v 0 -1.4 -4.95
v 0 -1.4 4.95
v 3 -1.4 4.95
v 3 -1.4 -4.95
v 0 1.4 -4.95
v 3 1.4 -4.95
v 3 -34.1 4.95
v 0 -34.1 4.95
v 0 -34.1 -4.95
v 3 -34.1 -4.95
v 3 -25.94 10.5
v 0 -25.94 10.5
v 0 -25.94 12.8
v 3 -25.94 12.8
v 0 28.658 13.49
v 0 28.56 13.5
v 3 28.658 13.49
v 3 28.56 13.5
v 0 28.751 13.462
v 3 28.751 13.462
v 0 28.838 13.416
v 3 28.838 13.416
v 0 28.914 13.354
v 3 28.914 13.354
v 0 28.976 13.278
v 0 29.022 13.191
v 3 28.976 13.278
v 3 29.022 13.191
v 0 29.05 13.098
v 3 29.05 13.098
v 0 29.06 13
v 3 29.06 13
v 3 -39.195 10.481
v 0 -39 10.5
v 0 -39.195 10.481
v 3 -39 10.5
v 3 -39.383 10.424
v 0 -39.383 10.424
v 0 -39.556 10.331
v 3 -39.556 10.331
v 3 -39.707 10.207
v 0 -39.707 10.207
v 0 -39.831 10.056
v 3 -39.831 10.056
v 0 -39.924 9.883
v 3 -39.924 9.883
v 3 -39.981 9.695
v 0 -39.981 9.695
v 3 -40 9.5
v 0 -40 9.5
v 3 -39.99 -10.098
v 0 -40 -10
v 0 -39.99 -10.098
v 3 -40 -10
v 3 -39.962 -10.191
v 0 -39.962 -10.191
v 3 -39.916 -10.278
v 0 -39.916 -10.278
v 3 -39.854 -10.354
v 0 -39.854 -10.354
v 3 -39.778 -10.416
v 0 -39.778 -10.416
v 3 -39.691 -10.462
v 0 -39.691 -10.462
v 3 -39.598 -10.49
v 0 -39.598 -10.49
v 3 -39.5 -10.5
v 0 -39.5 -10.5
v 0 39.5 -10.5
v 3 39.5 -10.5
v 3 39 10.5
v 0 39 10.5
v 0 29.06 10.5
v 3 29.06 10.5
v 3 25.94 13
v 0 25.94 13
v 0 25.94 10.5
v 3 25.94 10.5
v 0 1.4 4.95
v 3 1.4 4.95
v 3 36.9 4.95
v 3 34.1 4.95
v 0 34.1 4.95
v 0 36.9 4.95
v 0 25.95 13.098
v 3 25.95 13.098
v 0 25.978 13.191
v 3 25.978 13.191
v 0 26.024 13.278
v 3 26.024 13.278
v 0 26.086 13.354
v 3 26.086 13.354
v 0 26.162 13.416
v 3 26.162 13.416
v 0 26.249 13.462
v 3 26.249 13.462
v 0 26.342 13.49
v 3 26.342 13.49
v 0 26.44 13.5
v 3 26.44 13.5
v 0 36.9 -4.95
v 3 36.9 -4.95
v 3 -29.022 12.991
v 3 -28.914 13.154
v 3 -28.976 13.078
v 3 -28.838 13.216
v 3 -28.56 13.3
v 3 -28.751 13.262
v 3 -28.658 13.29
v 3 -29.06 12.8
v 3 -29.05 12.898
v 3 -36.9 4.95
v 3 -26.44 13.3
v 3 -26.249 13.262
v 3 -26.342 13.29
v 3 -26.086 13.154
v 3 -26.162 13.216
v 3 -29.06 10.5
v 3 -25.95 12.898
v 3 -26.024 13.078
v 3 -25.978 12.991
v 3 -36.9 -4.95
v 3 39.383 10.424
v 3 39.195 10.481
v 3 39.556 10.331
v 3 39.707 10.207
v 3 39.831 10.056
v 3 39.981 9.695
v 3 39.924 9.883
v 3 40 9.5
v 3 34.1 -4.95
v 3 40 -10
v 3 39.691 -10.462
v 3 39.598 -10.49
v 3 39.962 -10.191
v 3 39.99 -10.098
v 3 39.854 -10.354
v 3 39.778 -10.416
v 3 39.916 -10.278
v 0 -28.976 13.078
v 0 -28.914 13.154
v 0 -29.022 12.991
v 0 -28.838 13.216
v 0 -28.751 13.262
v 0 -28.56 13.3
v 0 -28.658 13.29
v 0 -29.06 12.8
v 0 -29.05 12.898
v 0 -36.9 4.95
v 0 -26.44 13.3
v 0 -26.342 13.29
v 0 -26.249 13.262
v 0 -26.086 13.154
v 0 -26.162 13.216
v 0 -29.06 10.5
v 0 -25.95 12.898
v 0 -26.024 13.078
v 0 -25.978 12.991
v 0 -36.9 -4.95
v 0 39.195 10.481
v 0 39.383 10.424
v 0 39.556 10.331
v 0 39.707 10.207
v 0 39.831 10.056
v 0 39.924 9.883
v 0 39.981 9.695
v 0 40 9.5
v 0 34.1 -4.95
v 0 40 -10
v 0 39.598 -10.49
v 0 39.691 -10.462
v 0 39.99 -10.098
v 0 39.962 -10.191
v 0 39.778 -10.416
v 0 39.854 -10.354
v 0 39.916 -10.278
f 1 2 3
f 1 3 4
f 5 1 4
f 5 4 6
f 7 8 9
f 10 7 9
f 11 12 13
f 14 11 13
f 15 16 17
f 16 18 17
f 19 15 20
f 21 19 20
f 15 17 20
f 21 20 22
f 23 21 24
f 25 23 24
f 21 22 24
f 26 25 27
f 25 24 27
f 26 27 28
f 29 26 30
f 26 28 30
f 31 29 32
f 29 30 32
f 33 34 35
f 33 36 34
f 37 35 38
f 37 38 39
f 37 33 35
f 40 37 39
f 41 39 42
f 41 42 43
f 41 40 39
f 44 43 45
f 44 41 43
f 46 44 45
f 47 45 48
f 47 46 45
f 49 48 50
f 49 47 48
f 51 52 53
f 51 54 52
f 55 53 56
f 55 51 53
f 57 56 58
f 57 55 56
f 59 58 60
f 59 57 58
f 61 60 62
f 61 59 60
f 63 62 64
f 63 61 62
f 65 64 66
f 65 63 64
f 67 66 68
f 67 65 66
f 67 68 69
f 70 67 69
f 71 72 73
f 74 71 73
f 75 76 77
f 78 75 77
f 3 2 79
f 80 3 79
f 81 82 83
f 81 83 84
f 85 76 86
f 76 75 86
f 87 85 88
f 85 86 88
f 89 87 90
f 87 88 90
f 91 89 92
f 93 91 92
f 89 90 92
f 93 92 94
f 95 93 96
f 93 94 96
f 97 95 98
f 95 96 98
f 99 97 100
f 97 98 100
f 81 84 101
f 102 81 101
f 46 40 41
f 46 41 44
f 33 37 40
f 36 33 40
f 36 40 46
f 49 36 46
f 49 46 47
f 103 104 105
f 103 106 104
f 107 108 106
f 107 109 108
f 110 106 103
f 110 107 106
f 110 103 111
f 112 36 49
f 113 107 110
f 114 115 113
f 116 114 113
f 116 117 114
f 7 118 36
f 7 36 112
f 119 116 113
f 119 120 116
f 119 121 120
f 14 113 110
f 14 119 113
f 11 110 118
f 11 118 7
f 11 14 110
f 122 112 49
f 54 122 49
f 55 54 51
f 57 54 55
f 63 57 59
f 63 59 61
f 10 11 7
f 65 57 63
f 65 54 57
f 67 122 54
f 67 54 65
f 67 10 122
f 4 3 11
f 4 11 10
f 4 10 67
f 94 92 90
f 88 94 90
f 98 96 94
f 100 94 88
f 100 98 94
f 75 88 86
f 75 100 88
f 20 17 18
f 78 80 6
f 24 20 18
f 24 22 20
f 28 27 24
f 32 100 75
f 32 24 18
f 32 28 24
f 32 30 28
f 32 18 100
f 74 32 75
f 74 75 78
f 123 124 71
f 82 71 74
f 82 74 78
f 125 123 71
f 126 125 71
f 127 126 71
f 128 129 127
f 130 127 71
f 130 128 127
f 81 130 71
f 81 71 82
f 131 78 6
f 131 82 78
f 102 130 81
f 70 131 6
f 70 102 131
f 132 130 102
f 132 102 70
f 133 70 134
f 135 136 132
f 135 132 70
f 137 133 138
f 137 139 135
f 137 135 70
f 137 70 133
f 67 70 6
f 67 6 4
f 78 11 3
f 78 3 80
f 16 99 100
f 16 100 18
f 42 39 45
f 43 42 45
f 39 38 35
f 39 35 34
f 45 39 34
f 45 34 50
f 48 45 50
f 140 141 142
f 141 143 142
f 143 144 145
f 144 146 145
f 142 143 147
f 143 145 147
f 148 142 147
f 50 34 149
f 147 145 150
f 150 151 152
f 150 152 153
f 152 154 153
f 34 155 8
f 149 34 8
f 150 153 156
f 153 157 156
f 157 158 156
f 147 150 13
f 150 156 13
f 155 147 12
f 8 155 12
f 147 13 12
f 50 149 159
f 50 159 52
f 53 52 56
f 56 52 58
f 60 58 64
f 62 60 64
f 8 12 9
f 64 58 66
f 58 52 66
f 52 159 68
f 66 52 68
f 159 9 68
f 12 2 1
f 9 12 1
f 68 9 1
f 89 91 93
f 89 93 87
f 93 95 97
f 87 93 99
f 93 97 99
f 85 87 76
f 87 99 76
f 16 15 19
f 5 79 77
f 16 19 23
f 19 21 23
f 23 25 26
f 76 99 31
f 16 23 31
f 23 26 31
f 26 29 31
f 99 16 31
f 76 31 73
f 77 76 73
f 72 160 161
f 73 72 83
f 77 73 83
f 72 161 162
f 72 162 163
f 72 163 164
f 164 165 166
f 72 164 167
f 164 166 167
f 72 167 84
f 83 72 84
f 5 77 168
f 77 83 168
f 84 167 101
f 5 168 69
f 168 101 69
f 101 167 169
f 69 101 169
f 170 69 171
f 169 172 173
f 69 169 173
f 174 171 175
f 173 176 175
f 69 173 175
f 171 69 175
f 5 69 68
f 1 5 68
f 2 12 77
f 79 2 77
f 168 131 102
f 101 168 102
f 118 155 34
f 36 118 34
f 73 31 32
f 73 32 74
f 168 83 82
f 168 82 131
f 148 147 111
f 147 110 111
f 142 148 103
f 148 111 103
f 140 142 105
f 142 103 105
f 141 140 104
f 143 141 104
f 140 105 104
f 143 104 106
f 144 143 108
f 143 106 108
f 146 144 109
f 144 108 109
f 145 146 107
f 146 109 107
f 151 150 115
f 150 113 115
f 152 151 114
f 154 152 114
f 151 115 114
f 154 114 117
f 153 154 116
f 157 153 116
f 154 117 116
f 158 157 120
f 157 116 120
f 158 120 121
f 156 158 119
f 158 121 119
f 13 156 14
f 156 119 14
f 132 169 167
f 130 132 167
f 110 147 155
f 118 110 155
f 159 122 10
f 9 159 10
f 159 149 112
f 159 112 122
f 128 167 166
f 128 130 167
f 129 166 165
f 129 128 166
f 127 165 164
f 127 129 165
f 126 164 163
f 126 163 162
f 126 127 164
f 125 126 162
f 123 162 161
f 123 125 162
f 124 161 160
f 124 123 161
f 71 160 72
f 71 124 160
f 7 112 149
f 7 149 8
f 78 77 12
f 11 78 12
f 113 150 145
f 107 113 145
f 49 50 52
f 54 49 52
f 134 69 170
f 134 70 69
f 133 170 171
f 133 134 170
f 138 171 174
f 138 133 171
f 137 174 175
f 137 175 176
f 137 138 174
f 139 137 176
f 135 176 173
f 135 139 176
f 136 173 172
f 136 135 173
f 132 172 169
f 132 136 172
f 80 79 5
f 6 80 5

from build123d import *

# Parameters (mm, degrees)
SKETCH_1_W      = 9.9
SKETCH_1_H      = 2.8
SKETCH_1_W_2    = 3
SKETCH_1_H_2    = 3.12
EXTRUDE_1_DEPTH = 3
FILLET_1_R      = 1
FILLET_2_R      = 0.5


with BuildPart() as part:
    # Эскиз1 → Бобышка-Вытянуть1 (new body)
    with BuildSketch(Plane(origin=(0, 0, 0), x_dir=(0, 0, -1), z_dir=(1, 0, 0))):
        Polygon((-13.3, -25.94), (-13.3, -29.06), (-10.5, -29.06), (-10.5, -40), (10.5, -40), (10.5, 40), (-10.5, 40), (-10.5, -25.94), align=None)
        with Locations((0, 35.5)):
            Rectangle(SKETCH_1_W, SKETCH_1_H, mode=Mode.SUBTRACT)
        Rectangle(SKETCH_1_W, SKETCH_1_H, mode=Mode.SUBTRACT)
        with Locations((0, -35.5)):
            Rectangle(SKETCH_1_W, SKETCH_1_H, mode=Mode.SUBTRACT)
        with Locations((-12, 27.5)):
            Rectangle(SKETCH_1_W_2, SKETCH_1_H_2)
    extrude(amount=EXTRUDE_1_DEPTH)

    # Скругление1
    fillet_1_edges = [part.edges().sort_by_distance(p)[0] for p in [
        (1.5, 40, 10.5),
        (1.5, -40, 10.5),
    ]]
    fillet(fillet_1_edges, radius=FILLET_1_R)

    # Скругление2
    fillet_2_edges = [part.edges().sort_by_distance(p)[0] for p in [
        (1.5, -25.94, 13.3),
        (1.5, 25.94, 13.5),
        (1.5, 29.06, 13.5),
        (1.5, 40, -10.5),
        (1.5, -40, -10.5),
        (1.5, -29.06, 13.3),
    ]]
    fillet(fillet_2_edges, radius=FILLET_2_R)


solid = part.part
